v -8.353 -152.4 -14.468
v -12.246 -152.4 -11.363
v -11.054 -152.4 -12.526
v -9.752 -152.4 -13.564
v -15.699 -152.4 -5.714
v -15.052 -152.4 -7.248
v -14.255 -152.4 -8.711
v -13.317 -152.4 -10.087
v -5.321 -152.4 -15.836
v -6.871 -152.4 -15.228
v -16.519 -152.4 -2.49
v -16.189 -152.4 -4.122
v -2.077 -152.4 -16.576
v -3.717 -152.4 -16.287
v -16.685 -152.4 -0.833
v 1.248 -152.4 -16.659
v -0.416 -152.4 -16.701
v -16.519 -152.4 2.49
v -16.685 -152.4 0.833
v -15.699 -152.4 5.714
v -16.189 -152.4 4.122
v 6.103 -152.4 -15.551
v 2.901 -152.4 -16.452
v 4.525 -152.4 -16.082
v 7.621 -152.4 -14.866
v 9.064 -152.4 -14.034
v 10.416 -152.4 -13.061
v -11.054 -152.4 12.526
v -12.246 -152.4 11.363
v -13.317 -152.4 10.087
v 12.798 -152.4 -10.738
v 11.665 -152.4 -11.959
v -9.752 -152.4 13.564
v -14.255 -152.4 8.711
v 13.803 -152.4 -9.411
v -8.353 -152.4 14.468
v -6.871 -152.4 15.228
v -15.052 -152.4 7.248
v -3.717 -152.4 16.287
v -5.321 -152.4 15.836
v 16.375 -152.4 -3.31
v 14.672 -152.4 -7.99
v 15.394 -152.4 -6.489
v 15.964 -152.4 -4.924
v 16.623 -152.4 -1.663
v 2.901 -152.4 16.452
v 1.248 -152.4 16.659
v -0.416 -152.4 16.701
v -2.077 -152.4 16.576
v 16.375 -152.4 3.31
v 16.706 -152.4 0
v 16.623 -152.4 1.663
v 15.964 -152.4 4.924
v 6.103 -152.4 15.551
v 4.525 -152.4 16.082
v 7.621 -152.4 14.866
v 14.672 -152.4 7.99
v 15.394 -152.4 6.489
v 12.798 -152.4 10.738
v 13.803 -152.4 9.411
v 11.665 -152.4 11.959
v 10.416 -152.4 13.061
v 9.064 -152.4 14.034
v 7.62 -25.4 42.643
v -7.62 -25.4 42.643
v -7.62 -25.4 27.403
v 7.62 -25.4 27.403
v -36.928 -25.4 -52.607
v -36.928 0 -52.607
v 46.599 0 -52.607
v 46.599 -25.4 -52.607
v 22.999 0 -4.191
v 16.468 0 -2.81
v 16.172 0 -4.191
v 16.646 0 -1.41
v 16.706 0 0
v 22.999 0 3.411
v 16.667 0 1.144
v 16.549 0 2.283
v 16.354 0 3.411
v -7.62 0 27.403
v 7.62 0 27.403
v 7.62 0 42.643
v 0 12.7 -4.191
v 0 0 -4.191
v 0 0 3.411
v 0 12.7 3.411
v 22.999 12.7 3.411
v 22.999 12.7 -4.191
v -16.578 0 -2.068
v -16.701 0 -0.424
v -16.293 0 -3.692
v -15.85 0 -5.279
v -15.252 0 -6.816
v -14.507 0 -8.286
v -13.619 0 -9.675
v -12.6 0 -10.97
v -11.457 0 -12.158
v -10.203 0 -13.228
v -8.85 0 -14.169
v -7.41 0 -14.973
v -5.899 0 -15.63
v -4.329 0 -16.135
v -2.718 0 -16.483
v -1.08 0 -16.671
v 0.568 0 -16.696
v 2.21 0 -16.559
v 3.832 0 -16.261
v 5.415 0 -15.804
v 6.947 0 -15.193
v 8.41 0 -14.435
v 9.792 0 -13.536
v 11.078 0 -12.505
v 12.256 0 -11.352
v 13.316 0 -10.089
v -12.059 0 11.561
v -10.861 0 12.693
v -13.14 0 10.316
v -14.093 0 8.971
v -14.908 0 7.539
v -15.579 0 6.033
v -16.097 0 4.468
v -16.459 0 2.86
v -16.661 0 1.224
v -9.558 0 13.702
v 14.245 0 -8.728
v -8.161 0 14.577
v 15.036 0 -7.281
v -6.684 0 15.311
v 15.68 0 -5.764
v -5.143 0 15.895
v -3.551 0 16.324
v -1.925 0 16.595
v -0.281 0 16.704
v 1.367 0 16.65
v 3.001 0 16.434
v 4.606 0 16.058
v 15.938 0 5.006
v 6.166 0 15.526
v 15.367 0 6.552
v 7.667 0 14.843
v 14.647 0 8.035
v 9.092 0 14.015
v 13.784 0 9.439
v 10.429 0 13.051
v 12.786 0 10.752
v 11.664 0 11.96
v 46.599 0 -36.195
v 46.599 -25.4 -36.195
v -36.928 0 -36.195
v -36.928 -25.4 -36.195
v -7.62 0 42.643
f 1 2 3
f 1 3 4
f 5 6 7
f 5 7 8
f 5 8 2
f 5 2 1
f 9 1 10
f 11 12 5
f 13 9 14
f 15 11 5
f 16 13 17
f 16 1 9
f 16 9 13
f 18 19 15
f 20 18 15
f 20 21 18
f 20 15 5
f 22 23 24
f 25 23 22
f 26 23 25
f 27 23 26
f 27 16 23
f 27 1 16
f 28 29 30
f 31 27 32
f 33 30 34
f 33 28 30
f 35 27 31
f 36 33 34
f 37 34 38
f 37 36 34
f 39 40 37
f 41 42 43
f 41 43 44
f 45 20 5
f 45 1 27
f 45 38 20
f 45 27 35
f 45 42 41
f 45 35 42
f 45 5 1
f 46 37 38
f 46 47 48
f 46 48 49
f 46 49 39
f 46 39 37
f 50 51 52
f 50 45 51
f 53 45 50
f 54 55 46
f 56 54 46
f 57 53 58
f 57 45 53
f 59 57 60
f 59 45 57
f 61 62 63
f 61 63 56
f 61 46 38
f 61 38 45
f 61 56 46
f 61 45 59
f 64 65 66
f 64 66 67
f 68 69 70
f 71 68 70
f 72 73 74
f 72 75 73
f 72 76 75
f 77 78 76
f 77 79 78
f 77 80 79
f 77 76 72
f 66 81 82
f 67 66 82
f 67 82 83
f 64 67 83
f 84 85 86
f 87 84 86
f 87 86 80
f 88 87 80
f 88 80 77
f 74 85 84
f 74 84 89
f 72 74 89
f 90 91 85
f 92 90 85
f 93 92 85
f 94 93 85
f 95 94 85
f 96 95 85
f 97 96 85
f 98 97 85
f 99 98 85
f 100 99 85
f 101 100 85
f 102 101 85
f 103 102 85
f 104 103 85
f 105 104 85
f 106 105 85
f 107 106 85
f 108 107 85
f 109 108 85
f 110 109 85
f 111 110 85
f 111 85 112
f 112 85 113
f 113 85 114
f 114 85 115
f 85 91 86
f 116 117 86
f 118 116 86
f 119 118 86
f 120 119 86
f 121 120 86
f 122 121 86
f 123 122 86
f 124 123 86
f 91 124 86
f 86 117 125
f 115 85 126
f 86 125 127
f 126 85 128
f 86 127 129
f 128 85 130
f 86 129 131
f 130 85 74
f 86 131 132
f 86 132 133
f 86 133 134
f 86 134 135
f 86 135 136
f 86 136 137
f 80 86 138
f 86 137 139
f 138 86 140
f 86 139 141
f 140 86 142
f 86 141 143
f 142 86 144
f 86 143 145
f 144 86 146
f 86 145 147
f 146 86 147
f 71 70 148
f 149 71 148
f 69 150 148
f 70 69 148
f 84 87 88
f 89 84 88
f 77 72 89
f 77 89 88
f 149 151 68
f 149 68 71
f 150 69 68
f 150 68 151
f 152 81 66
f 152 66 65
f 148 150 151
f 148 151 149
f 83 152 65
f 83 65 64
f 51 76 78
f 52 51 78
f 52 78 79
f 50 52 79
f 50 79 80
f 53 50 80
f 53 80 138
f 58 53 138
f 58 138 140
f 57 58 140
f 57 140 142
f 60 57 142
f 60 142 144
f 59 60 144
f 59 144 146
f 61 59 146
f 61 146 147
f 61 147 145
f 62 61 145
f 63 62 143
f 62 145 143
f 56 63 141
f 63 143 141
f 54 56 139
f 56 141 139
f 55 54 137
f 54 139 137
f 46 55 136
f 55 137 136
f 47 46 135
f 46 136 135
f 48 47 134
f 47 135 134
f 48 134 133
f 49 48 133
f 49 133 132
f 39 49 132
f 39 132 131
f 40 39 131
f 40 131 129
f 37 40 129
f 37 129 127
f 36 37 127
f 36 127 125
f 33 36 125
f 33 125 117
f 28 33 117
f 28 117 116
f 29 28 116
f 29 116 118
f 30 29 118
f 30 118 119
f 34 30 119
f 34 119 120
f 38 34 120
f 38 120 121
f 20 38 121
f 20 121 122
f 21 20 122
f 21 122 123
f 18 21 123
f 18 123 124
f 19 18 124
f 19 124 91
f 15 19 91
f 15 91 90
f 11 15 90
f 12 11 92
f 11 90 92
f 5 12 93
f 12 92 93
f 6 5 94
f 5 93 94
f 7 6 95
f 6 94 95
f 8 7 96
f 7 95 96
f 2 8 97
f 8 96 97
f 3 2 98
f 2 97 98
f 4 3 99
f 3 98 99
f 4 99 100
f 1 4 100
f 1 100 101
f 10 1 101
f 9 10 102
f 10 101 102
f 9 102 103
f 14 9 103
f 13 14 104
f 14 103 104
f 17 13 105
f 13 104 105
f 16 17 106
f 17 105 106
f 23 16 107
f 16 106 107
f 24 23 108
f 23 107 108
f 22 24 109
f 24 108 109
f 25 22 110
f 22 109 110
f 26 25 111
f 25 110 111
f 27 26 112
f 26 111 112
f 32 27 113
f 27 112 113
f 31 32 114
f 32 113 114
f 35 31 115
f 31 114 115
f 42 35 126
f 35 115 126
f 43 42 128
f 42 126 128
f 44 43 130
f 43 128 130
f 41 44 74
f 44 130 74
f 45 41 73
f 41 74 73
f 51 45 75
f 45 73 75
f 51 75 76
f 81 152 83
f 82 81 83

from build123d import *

# Parameters (mm, degrees)
F0_R      = 16.70604
F1_DEPTH  = 127
F0_W      = 83.526968
F0_H      = 16.412316
F0_W_2    = 15.24
F0_H_2    = 15.24
F1_FACE_R = 16.70604
F2_DEPTH  = 25.4
F3_W      = 22.999221
F3_H      = 7.601437
F4_DEPTH  = 12.7


with BuildPart() as f1:
    # F0 (on Front) → F1 (new body)
    with BuildSketch(Plane.XZ):
        Circle(F0_R)
    extrude(amount=F1_DEPTH)

    # F0 (on Front) + F1_face (on face) → F2 (join)
    with BuildSketch(Plane.XZ):
        Circle(F0_R)
        with Locations((4.835775, -44.401174)):
            Rectangle(F0_W, F0_H)
        with Locations((0, 35.022711)):
            Rectangle(F0_W_2, F0_H_2)
    with BuildSketch(Plane.XZ.offset(127)):
        Circle(F1_FACE_R)
    extrude(amount=F2_DEPTH)

    # F3 (on Front) → F4 (join)
    with BuildSketch(Plane.XZ):
        with Locations((11.49961, -0.389817)):
            Rectangle(F3_W, F3_H)
    extrude(amount=-F4_DEPTH)


solid = f1.part
